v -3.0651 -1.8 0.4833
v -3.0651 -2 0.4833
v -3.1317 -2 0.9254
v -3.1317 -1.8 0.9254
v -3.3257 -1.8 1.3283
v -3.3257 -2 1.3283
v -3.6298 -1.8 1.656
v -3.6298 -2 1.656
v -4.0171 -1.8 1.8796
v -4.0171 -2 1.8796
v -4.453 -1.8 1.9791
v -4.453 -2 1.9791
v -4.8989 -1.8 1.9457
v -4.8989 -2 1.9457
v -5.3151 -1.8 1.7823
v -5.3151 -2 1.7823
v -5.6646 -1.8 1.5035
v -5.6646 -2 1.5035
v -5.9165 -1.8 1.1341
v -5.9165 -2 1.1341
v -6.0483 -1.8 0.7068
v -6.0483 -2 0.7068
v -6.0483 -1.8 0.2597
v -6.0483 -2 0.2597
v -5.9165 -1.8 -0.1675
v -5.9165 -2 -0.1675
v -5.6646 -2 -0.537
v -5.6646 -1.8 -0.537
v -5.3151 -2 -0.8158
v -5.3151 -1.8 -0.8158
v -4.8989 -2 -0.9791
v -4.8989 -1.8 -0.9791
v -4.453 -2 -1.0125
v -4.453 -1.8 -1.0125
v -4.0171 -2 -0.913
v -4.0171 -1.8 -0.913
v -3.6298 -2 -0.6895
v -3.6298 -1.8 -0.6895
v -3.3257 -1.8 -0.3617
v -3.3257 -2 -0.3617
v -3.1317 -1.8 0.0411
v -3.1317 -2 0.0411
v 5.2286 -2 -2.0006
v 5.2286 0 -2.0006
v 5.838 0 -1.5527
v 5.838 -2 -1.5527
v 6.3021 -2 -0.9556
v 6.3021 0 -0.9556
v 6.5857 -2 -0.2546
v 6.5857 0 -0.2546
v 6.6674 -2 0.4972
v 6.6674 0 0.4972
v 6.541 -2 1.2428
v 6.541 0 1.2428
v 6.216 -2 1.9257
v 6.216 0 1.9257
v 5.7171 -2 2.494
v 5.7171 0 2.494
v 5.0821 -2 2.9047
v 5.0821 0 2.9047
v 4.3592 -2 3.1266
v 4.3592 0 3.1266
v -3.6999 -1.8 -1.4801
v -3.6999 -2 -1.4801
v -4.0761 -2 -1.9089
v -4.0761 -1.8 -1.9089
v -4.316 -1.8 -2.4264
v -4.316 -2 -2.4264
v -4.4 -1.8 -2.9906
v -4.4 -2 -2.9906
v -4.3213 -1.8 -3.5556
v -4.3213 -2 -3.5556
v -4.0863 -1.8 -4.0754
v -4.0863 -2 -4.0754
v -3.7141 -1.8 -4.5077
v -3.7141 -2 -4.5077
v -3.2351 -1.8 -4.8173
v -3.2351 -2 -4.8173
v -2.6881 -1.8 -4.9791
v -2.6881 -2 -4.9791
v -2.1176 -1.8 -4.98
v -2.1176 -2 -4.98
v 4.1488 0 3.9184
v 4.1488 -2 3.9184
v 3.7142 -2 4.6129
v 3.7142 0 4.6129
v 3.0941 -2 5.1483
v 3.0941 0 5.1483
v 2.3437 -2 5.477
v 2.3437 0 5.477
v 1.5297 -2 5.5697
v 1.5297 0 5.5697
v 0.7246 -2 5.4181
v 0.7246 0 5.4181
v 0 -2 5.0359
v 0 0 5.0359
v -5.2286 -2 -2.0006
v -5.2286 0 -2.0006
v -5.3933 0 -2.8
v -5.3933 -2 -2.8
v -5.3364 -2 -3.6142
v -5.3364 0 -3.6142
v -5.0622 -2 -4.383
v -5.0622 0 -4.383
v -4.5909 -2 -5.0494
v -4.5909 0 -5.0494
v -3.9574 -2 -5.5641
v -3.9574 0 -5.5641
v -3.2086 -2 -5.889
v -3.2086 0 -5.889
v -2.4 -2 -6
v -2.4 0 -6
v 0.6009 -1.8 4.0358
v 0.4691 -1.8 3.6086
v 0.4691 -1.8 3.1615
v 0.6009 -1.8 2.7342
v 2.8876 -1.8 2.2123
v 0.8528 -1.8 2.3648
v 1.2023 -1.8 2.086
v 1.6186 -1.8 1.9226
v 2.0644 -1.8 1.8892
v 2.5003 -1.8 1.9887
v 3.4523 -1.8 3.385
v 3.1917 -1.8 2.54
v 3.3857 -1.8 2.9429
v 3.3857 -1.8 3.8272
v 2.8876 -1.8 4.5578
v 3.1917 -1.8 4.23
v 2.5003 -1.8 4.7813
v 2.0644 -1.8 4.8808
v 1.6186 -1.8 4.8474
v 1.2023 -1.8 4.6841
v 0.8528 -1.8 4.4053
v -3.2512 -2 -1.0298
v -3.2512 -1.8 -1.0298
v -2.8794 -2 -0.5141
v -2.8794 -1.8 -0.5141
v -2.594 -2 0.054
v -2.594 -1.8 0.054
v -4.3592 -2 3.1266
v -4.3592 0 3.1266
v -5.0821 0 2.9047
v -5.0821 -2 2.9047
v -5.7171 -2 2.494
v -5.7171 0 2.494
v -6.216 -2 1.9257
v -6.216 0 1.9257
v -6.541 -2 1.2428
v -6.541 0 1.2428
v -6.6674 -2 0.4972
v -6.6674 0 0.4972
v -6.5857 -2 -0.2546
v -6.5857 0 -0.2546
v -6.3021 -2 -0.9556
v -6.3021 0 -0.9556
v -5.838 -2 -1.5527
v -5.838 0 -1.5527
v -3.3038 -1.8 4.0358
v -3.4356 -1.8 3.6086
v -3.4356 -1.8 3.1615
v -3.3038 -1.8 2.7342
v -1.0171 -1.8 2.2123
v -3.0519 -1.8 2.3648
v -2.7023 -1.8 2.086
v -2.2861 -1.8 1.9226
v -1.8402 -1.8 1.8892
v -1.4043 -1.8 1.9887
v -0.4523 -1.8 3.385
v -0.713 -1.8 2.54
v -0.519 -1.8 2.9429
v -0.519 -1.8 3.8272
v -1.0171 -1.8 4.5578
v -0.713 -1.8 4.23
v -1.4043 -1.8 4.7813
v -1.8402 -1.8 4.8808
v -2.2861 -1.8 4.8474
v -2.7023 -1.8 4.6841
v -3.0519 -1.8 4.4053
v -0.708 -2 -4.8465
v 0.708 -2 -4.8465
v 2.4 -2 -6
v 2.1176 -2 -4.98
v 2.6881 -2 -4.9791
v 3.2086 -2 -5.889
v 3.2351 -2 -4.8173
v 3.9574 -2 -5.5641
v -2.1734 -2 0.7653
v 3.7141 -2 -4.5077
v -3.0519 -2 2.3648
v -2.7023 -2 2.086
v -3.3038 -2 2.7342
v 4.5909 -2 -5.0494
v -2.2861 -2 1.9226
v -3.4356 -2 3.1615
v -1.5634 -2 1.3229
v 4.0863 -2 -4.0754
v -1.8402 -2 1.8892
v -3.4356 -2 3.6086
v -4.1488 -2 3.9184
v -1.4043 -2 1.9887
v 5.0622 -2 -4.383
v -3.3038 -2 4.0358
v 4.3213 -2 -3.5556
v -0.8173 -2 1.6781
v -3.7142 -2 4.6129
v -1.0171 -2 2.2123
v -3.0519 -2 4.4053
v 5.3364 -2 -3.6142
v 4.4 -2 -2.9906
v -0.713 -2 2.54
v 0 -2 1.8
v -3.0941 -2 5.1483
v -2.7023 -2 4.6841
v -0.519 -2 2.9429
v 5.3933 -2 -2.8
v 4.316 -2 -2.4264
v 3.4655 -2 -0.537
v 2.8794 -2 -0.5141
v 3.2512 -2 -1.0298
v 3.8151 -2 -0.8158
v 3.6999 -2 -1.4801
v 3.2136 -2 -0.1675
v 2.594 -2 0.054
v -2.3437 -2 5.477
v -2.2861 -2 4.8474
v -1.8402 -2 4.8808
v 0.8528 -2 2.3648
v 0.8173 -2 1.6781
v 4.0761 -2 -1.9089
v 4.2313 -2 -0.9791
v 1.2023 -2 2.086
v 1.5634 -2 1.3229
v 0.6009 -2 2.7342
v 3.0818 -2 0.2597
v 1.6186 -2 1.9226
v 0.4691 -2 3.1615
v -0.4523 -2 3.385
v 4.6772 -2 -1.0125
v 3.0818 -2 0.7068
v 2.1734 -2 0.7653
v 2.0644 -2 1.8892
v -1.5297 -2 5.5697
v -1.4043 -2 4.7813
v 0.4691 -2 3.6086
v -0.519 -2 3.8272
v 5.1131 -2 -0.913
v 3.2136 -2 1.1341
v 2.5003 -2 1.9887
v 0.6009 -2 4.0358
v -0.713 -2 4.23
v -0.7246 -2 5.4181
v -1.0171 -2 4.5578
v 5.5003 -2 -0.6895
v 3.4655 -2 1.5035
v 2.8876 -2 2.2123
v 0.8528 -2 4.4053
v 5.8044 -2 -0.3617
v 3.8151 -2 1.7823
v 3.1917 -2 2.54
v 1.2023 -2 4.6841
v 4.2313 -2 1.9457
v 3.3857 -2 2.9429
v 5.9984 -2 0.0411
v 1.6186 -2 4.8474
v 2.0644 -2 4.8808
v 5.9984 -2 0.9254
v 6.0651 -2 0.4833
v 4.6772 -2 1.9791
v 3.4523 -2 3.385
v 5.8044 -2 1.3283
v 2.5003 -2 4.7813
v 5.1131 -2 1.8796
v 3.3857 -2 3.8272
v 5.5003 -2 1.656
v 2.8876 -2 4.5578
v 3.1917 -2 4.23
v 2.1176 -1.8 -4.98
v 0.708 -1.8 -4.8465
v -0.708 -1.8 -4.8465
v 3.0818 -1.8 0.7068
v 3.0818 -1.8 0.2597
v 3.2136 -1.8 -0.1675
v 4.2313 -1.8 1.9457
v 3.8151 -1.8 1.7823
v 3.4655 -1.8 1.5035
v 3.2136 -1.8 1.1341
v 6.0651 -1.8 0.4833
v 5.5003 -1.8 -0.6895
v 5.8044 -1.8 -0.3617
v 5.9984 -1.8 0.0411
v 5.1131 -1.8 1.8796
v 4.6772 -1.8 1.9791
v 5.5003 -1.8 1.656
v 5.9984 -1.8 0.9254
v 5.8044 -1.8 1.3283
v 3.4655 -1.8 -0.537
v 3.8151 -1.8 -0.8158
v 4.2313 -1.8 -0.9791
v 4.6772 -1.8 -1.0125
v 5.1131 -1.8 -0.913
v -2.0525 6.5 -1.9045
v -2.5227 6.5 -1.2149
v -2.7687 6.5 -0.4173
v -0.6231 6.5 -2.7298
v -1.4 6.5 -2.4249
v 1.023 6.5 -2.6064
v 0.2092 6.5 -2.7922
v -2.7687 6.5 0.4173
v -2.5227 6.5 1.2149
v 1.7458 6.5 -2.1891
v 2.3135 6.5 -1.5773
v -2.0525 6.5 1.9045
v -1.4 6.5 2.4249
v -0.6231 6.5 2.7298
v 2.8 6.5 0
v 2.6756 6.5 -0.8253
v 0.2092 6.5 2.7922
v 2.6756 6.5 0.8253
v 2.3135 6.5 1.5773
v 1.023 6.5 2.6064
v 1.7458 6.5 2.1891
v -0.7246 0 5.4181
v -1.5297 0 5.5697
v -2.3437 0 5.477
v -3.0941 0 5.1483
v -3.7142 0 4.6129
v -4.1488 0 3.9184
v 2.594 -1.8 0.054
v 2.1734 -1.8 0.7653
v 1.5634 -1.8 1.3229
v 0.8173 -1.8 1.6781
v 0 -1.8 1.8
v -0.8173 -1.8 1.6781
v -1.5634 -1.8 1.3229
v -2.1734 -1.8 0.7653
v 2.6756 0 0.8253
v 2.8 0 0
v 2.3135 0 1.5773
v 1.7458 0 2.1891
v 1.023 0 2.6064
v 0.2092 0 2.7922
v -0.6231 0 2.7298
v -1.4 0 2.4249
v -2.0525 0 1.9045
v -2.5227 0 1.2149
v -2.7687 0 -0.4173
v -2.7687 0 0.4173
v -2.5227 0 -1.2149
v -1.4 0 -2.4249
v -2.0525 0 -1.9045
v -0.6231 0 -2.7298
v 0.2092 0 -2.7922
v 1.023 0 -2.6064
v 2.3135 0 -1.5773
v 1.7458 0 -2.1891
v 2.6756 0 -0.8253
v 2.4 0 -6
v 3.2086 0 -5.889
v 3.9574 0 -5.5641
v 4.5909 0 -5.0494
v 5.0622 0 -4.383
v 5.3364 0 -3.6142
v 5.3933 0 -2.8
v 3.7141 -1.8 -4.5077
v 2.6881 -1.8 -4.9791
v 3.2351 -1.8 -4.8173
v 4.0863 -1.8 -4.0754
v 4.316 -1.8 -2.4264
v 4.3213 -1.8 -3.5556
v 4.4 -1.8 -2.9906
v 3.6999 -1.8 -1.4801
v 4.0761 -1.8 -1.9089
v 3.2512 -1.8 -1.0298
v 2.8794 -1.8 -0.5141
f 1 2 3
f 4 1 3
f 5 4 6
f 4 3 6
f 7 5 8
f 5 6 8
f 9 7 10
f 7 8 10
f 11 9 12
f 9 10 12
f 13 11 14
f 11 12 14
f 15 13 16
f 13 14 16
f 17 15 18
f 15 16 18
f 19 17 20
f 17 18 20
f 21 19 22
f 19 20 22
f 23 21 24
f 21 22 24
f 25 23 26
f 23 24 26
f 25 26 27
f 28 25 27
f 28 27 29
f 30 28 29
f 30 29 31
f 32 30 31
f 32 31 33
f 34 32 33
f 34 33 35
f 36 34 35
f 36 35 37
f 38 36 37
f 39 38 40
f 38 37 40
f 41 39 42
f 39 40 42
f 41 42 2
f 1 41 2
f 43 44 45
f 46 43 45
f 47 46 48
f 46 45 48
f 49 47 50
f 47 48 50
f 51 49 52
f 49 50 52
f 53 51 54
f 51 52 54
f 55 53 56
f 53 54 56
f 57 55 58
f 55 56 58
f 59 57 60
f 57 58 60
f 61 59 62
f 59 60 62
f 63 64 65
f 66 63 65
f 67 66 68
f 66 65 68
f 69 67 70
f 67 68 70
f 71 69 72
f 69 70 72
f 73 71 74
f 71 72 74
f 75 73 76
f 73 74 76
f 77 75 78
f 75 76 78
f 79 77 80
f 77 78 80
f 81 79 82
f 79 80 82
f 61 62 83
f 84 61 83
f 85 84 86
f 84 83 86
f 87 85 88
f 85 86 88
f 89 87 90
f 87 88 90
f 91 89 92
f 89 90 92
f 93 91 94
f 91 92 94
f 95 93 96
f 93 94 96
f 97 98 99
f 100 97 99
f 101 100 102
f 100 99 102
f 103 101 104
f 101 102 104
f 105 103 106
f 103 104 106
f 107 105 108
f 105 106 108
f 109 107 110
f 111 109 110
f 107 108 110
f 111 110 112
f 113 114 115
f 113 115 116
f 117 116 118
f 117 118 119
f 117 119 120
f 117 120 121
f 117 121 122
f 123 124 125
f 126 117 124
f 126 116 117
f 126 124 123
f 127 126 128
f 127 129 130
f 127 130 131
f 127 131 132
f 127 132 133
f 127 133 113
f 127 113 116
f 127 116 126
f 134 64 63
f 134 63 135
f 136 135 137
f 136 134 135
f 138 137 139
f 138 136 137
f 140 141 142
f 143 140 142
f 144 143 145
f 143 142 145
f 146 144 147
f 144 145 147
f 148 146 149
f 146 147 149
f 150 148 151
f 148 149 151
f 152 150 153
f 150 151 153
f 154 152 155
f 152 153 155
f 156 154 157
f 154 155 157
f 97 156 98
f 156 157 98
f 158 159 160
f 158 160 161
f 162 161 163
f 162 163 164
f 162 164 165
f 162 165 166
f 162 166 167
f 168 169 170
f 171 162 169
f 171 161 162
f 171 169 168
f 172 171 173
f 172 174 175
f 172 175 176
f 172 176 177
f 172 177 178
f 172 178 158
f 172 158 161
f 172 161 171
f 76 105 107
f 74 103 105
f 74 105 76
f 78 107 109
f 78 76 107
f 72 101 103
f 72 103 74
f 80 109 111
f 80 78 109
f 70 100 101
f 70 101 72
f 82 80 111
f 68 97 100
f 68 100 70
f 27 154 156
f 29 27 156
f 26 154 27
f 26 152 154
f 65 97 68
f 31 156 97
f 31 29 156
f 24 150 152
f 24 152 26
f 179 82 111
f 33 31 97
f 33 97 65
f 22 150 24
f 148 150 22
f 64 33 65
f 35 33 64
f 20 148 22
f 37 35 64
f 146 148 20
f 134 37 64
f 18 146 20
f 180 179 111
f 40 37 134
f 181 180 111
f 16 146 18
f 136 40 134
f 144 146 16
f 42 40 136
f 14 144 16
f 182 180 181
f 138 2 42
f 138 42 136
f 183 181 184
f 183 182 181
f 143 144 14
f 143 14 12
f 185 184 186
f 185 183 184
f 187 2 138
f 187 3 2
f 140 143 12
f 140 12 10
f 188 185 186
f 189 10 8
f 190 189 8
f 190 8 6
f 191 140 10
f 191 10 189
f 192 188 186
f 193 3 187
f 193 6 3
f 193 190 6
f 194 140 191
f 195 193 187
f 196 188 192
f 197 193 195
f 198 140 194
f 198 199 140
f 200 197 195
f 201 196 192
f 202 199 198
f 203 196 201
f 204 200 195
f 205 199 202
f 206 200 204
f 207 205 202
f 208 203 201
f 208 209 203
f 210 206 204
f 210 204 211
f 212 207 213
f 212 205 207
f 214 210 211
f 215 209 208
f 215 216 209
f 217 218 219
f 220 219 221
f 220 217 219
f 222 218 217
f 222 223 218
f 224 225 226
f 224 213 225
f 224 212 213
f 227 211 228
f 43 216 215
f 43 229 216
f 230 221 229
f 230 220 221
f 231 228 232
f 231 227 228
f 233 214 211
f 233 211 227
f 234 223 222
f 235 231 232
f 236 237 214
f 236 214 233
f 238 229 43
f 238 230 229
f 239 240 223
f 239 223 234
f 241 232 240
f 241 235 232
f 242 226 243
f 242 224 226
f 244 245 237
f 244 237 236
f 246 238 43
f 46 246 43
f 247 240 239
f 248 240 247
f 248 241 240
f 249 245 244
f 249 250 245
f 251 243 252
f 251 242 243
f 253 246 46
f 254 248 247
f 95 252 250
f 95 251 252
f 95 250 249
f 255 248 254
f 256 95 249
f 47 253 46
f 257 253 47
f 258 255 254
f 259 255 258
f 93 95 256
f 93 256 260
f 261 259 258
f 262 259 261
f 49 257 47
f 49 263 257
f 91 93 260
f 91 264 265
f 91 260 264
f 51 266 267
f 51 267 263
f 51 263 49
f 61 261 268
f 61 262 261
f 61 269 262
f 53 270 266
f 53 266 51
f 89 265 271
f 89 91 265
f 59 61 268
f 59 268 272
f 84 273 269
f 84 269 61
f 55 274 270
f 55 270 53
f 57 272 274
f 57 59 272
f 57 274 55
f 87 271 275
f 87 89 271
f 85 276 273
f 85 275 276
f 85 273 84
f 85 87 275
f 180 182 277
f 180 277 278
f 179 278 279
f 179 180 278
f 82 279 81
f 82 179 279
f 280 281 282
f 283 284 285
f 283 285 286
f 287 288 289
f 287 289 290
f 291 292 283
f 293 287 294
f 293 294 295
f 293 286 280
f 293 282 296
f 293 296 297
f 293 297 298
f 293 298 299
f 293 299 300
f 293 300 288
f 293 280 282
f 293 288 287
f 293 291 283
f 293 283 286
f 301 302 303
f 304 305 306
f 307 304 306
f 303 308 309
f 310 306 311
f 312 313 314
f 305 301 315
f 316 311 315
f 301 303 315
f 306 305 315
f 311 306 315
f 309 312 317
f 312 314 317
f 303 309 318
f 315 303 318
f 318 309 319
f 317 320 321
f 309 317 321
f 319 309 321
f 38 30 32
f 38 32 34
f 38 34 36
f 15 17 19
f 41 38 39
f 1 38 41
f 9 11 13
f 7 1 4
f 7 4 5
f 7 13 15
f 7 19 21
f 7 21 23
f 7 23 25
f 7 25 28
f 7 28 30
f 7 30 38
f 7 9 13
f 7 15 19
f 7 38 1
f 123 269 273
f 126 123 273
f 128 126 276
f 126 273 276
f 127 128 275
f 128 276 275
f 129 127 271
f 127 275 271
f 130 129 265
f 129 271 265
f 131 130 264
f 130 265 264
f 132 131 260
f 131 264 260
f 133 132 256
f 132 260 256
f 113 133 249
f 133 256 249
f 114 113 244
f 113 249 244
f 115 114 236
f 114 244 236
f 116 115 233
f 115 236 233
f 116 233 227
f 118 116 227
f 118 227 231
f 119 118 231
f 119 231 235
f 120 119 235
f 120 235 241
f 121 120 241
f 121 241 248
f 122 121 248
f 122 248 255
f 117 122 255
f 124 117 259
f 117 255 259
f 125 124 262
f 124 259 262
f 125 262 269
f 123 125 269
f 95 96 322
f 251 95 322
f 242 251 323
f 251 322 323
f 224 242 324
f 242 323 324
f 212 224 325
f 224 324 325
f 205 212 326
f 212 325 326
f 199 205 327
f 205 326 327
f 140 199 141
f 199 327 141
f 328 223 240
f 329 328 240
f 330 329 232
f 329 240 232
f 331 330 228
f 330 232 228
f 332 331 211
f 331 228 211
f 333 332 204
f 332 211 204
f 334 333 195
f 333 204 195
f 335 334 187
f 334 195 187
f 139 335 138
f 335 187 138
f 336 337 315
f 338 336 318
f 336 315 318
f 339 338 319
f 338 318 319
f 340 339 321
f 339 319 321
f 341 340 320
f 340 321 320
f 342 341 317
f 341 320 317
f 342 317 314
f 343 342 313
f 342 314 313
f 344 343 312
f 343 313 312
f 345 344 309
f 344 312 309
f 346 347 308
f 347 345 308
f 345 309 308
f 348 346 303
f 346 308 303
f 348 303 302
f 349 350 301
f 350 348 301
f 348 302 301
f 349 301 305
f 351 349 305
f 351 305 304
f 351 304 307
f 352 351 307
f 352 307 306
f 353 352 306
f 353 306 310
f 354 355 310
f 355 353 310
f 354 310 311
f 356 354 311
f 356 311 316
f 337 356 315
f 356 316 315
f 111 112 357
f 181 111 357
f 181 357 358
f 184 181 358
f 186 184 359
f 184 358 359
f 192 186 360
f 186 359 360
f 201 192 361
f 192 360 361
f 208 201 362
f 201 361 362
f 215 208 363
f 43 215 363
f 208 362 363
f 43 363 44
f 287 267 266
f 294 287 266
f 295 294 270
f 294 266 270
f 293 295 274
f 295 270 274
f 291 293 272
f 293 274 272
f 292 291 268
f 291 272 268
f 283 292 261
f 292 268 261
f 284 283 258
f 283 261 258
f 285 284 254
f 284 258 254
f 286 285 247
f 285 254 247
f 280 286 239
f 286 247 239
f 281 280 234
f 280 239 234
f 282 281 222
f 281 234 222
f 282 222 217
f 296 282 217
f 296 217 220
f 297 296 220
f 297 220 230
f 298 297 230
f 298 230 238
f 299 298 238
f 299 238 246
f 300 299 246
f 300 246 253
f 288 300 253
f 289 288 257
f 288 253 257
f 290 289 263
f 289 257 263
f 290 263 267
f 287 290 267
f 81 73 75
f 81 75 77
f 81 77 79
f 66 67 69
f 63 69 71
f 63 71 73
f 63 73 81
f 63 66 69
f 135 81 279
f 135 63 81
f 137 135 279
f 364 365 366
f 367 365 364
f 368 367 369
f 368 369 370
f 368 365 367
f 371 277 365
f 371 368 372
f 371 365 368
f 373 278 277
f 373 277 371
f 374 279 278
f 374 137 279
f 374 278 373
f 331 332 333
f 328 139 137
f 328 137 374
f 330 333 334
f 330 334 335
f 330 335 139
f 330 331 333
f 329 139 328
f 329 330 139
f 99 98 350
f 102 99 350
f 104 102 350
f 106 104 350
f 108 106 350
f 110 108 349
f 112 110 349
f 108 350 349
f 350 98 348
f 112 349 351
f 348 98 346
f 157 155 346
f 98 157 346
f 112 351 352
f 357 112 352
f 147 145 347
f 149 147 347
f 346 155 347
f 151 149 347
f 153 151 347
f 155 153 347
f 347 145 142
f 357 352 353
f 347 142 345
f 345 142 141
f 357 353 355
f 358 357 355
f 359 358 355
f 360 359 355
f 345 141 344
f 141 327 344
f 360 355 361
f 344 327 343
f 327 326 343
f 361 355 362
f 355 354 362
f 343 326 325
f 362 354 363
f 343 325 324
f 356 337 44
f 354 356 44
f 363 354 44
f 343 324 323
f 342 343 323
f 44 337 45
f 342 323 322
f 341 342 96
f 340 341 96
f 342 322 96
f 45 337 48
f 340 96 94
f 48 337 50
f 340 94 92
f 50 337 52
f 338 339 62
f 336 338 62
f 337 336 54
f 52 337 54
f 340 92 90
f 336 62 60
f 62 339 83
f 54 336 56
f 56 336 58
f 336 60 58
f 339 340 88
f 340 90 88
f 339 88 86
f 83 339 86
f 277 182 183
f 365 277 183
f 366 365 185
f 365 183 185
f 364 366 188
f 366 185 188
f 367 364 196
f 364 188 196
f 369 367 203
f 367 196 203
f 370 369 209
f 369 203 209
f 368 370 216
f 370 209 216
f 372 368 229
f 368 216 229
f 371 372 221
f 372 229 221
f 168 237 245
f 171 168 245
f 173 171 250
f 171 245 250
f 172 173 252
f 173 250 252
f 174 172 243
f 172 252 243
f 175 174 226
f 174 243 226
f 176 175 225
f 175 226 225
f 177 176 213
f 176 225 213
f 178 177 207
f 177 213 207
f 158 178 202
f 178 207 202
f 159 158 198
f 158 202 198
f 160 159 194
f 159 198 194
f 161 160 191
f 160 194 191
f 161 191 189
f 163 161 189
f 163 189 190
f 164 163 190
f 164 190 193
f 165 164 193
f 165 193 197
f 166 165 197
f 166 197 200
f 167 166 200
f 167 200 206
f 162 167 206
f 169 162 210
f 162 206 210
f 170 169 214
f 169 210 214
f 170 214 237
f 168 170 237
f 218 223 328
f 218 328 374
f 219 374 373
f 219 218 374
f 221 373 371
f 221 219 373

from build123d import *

# Parameters (mm, degrees)
CYLINDER004_R     = 2.8
CYLINDER004_DEPTH = 7.5
PAD010_DEPTH      = 2
SKETCH037_R       = 1.5
POCKET008_DEPTH   = 0.2


with BuildPart() as part:
    # Cylinder004 → Cylinder004 (join)
    with BuildSketch(Plane.XZ.offset(-6.5)):
        Circle(CYLINDER004_R)
    extrude(amount=CYLINDER004_DEPTH)

    # Sketch036 → Pad010 (join)
    with BuildSketch(Plane.XZ):
        with BuildLine():
            ThreePointArc((-4.359163, 3.126626), (-6.630007, 0.874403), (-5.228622, -2.000551))
            ThreePointArc((-5.228622, -2.000551), (-4.849321, -4.732289), (-2.4, -6))
            Line((-2.4, -6), (2.4, -6))
            ThreePointArc((2.4, -6), (4.849321, -4.732289), (5.228622, -2.000551))
            ThreePointArc((5.228622, -2.000551), (6.630007, 0.874403), (4.359163, 3.126626))
            ThreePointArc((4.359163, 3.126626), (2.731228, 5.340757), (0, 5.035887))
            ThreePointArc((0, 5.035887), (-2.731228, 5.340757), (-4.359163, 3.126626))
        make_face()
    extrude(amount=PAD010_DEPTH)

    # Sketch037 → Pocket008 (cut)
    with BuildSketch(Plane(origin=(0, -2, -1), x_dir=(1, 0, 0), z_dir=(0, -1, 0))):
        with Locations((-4.565071, 1.483282)):
            Circle(SKETCH037_R)
        with Locations((4.565071, 1.483282)):
            Circle(SKETCH037_R)
        with Locations((-1.952336, 4.385018)):
            Circle(SKETCH037_R)
        with Locations((1.952336, 4.385018)):
            Circle(SKETCH037_R)
        with BuildLine():
            ThreePointArc((2.594039, 1.054023), (0, 2.8), (-2.594039, 1.054023))
            ThreePointArc((-3.699936, -0.480077), (-3.055021, 0.220676), (-2.594039, 1.054023))
            ThreePointArc((-3.699936, -0.480077), (-4.22241, -2.823905), (-2.117647, -3.979969))
            ThreePointArc((2.117647, -3.979969), (0, -3.829736), (-2.117647, -3.979969))
            ThreePointArc((2.117647, -3.979969), (4.22241, -2.823905), (3.699936, -0.480077))
            ThreePointArc((2.594039, 1.054023), (3.055021, 0.220676), (3.699936, -0.480077))
        make_face()
    extrude(amount=-POCKET008_DEPTH, mode=Mode.SUBTRACT)


solid = part.part
